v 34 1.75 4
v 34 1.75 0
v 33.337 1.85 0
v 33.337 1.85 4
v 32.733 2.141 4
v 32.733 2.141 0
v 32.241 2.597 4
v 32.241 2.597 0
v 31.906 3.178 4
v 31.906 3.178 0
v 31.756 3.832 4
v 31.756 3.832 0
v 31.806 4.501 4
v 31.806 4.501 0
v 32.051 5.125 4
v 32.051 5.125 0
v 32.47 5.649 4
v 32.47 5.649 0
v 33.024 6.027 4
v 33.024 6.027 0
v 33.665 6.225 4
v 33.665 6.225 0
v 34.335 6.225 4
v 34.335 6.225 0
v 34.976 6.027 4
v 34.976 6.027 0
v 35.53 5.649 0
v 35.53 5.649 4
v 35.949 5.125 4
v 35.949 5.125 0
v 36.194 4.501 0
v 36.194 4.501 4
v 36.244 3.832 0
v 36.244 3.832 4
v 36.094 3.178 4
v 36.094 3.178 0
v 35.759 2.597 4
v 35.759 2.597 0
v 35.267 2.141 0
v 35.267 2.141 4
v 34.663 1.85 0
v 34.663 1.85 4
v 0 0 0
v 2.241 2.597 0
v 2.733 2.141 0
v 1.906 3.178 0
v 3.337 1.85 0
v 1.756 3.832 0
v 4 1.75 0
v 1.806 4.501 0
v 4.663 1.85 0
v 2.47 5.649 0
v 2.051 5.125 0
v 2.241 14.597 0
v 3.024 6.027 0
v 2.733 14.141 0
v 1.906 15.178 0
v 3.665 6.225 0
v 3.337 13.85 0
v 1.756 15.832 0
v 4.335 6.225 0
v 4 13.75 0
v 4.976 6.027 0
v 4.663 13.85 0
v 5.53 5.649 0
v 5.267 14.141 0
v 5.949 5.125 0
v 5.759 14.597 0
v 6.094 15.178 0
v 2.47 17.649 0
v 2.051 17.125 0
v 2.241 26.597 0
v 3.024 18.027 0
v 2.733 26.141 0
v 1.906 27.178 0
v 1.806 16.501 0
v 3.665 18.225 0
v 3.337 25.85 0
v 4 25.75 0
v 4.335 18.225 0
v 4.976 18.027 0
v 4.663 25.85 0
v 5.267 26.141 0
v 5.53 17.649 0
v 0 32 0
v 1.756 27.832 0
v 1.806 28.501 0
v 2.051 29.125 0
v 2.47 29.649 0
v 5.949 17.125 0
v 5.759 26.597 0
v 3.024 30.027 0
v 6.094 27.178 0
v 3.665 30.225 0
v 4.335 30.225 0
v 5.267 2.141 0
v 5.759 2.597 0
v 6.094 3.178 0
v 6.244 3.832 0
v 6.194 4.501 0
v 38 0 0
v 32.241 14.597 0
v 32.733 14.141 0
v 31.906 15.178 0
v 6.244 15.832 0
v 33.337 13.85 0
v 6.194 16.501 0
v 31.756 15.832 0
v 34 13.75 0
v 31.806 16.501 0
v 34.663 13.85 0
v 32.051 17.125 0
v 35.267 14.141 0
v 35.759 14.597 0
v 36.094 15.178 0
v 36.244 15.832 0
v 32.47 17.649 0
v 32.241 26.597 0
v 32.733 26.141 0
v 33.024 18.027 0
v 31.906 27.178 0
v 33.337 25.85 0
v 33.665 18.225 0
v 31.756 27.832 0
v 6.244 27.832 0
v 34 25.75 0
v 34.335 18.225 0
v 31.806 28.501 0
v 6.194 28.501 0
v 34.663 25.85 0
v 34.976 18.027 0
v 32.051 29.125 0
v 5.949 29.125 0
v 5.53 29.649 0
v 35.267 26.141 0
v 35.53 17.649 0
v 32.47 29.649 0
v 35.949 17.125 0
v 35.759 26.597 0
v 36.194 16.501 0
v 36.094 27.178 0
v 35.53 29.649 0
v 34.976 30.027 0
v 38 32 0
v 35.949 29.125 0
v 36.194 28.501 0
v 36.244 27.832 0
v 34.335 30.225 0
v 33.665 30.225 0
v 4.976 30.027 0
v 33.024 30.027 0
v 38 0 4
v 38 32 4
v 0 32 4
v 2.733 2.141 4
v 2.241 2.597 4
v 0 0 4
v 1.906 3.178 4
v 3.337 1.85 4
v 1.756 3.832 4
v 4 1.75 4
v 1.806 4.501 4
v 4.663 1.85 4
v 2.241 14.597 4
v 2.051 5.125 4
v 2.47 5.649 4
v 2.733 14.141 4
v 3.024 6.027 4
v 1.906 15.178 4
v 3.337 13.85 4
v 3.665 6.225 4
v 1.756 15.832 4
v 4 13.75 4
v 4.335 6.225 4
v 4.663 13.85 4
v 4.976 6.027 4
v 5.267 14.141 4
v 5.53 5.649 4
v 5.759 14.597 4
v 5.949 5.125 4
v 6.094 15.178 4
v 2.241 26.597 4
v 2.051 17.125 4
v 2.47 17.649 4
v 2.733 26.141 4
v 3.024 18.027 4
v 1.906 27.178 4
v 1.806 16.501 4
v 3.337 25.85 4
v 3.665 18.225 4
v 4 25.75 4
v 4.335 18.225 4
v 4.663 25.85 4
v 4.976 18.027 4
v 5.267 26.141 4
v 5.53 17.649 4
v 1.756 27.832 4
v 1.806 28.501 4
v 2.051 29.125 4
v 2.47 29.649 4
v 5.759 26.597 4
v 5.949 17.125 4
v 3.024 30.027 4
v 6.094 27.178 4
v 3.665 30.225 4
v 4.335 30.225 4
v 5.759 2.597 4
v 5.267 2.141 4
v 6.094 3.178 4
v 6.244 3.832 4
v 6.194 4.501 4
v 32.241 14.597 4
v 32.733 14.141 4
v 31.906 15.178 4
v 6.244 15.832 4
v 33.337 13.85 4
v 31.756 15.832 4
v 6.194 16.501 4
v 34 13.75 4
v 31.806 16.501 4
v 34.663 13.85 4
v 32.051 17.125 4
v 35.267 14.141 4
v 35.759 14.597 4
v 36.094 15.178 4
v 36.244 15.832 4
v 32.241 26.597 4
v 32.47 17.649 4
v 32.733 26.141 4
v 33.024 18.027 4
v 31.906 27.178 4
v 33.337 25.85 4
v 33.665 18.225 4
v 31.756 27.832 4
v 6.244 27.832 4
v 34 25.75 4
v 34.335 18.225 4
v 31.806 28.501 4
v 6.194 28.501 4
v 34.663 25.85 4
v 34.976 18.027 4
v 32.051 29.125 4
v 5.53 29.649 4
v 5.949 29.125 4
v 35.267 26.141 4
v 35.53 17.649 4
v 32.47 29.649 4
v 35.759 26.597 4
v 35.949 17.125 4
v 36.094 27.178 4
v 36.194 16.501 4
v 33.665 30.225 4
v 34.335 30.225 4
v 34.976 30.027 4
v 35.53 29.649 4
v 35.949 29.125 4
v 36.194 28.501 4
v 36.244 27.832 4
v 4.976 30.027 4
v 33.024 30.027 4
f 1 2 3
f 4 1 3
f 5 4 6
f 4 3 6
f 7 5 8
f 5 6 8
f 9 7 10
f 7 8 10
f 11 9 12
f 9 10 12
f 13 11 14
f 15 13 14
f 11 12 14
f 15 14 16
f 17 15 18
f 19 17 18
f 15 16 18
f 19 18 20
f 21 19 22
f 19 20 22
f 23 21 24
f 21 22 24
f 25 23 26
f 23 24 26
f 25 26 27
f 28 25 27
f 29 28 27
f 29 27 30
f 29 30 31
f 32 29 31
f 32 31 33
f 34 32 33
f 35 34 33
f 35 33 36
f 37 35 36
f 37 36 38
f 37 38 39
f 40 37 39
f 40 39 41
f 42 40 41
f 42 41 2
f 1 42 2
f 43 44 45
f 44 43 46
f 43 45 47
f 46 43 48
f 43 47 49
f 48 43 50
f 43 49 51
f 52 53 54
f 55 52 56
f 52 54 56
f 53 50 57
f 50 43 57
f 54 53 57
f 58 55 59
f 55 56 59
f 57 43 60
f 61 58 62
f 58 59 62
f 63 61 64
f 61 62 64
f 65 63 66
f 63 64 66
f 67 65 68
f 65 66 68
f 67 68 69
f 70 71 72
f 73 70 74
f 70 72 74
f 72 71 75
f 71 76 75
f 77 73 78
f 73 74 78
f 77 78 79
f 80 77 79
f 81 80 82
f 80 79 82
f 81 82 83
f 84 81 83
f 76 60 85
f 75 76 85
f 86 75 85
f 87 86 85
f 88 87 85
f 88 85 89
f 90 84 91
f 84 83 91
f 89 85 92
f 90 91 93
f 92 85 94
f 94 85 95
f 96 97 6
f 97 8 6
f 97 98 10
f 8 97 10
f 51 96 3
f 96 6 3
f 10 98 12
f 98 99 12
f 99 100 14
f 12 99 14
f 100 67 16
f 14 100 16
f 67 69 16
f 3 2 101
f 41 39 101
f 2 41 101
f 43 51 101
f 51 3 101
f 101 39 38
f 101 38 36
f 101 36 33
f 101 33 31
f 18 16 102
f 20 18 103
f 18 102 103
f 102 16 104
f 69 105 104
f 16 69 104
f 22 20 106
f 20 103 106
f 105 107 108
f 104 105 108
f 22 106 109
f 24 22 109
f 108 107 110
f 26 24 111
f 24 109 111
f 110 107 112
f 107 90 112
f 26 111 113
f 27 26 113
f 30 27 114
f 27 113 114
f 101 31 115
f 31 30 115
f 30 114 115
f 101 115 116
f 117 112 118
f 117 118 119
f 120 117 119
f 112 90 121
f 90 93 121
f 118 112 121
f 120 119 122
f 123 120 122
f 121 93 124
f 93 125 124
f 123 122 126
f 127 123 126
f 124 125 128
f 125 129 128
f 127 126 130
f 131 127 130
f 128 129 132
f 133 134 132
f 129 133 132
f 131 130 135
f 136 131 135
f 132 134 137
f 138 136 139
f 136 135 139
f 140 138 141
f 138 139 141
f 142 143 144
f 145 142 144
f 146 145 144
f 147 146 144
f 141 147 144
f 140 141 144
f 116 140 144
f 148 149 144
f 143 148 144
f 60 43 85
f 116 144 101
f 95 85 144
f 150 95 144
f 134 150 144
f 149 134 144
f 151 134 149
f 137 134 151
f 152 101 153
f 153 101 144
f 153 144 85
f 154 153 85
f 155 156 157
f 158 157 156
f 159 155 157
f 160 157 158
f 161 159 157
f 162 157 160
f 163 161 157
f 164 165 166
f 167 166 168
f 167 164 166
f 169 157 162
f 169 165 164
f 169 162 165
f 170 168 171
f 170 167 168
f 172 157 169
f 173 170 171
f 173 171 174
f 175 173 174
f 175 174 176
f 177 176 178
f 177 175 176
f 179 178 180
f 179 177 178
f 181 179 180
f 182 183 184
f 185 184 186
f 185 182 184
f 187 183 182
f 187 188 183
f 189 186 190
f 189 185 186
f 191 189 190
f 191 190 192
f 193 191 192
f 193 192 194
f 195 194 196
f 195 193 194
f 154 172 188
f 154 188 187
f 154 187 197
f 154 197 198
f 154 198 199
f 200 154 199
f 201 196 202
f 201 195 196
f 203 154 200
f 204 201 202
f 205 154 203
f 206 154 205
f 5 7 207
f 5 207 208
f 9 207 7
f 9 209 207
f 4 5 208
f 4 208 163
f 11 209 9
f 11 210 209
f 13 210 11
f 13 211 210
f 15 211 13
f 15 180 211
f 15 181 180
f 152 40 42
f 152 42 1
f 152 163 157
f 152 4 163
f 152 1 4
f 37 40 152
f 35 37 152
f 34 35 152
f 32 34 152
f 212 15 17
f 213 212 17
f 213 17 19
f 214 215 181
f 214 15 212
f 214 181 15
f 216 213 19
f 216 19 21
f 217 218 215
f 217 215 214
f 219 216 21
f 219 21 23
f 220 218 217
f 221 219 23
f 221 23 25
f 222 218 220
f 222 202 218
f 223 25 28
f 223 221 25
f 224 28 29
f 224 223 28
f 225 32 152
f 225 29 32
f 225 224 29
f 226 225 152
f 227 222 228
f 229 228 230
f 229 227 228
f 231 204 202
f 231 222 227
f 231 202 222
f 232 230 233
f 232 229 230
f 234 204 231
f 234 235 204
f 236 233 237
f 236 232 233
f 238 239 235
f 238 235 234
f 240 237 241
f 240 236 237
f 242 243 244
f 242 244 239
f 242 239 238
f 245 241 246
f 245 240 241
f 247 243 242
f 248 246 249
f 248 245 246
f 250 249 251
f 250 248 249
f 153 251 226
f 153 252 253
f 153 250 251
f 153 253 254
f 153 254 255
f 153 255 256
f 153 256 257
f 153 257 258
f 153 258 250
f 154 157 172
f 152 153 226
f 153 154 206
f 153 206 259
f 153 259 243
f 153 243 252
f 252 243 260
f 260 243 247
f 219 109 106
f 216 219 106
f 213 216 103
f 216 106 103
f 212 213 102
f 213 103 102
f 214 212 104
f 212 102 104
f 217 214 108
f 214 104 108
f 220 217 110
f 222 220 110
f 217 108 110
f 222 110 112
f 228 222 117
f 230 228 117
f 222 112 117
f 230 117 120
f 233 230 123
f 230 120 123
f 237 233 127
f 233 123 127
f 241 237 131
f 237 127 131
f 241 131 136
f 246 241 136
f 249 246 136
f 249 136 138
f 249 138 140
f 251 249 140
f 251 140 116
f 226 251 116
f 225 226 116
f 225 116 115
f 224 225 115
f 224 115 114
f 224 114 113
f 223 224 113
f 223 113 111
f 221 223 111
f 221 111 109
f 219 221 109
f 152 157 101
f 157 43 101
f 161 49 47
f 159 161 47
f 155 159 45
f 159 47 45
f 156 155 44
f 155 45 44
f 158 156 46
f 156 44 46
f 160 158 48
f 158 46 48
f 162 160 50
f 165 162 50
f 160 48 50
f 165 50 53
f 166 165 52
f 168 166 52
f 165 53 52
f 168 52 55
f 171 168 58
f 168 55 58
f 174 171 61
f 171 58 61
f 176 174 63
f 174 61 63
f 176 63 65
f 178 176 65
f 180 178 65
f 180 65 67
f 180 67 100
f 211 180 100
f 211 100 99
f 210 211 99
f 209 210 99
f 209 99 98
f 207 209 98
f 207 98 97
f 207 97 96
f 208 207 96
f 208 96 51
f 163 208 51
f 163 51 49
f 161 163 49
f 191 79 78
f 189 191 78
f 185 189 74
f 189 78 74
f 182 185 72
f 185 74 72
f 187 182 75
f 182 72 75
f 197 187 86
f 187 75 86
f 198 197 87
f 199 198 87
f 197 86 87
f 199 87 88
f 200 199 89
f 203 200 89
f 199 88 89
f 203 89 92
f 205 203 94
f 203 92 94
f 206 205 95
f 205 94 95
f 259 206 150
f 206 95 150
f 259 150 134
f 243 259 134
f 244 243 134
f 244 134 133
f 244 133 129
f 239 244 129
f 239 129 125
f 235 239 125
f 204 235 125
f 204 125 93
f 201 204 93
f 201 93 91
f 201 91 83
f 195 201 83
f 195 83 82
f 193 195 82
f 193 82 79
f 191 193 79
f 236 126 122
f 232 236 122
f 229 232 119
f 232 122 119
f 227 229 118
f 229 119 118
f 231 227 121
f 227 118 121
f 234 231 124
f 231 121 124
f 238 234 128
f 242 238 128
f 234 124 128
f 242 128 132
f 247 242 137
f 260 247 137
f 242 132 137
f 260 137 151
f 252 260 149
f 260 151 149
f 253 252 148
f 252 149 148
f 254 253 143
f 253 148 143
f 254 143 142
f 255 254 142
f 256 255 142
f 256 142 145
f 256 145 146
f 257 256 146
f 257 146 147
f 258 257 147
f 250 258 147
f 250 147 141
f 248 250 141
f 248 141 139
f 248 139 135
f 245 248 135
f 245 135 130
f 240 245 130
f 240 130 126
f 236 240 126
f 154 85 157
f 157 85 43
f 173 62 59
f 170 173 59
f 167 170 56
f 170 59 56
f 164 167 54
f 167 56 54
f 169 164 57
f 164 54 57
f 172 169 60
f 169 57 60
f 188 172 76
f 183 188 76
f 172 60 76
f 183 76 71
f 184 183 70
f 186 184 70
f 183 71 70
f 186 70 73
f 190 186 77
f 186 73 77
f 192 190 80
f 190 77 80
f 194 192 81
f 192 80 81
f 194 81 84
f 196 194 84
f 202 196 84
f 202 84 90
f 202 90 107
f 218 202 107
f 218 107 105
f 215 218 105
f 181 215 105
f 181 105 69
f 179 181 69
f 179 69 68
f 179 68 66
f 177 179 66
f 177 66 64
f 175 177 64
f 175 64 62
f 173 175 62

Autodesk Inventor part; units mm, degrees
ref_plane "YZ Plane" through (0, 0, 0) normal (1, 0, 0) x (0, 1, 0)
ref_plane "XZ Plane" through (0, 0, 0) normal (0, 1, 0) x (-1, 0, 0)
ref_plane "XY Plane" through (0, 0, 0) normal (0, 0, 1) x (1, 0, 0)
sketch "スケッチ1" plane through (0, 0, 0) normal (0, 0, 1) x (1, 0, 0)
  line L0 (0, 0) -> (38, 0)
  line L1 (38, 0) -> (38, 32)
  line L2 (38, 32) -> (0, 32)
  line L3 (0, 32) -> (0, 0)
  dimension "d0" = 38
  dimension "d1" = 32
extrude "押し出し1" add sketch "スケッチ1" along normal blind 4
sketch "スケッチ2" plane through (0, 0, 4) normal (0, 0, 1) x (1, 0, 0)
  line L0 (0, 0) -> (38, 0) projected
  line L1 (0, 32) -> (0, 0) projected
  point P0 (4, 4)
  point P1 (4, 28)
  point P2 (34, 4)
  point P3 (34, 28)
  dimension "d4" = 4
  dimension "d5" = 4
  dimension "d8" = 24
  dimension "d11" = 30
hole "穴1" at (4, 4, 4) at (4, 28, 4) at (34, 4, 4) at (34, 28, 4) direction (0, 0, -1) diameter 4.5 end through all
sketch "スケッチ3" plane through (0, 0, 4) normal (0, 0, 1) x (1, 0, 0)
  line L0 (0, 32) -> (0, 0) projected
  line L1 (0, 16) -> (4, 16)
  line L2 (34, 16) -> (38, 16)
  line L3 (38, 0) -> (38, 32) projected
  line L4 (4, 16) -> (34, 16)
  dimension "d28" = 30
hole "穴2" at (4, 16, 4) at (34, 16, 4) direction (0, 0, -1) diameter 4.5 depth 4 clearance for "Countersunk Flat Head Screw ISO 2009/7046" size "M4" standard "ISO"
properties part number "RD004_スペーサ" material "ナイロン 6/6"
